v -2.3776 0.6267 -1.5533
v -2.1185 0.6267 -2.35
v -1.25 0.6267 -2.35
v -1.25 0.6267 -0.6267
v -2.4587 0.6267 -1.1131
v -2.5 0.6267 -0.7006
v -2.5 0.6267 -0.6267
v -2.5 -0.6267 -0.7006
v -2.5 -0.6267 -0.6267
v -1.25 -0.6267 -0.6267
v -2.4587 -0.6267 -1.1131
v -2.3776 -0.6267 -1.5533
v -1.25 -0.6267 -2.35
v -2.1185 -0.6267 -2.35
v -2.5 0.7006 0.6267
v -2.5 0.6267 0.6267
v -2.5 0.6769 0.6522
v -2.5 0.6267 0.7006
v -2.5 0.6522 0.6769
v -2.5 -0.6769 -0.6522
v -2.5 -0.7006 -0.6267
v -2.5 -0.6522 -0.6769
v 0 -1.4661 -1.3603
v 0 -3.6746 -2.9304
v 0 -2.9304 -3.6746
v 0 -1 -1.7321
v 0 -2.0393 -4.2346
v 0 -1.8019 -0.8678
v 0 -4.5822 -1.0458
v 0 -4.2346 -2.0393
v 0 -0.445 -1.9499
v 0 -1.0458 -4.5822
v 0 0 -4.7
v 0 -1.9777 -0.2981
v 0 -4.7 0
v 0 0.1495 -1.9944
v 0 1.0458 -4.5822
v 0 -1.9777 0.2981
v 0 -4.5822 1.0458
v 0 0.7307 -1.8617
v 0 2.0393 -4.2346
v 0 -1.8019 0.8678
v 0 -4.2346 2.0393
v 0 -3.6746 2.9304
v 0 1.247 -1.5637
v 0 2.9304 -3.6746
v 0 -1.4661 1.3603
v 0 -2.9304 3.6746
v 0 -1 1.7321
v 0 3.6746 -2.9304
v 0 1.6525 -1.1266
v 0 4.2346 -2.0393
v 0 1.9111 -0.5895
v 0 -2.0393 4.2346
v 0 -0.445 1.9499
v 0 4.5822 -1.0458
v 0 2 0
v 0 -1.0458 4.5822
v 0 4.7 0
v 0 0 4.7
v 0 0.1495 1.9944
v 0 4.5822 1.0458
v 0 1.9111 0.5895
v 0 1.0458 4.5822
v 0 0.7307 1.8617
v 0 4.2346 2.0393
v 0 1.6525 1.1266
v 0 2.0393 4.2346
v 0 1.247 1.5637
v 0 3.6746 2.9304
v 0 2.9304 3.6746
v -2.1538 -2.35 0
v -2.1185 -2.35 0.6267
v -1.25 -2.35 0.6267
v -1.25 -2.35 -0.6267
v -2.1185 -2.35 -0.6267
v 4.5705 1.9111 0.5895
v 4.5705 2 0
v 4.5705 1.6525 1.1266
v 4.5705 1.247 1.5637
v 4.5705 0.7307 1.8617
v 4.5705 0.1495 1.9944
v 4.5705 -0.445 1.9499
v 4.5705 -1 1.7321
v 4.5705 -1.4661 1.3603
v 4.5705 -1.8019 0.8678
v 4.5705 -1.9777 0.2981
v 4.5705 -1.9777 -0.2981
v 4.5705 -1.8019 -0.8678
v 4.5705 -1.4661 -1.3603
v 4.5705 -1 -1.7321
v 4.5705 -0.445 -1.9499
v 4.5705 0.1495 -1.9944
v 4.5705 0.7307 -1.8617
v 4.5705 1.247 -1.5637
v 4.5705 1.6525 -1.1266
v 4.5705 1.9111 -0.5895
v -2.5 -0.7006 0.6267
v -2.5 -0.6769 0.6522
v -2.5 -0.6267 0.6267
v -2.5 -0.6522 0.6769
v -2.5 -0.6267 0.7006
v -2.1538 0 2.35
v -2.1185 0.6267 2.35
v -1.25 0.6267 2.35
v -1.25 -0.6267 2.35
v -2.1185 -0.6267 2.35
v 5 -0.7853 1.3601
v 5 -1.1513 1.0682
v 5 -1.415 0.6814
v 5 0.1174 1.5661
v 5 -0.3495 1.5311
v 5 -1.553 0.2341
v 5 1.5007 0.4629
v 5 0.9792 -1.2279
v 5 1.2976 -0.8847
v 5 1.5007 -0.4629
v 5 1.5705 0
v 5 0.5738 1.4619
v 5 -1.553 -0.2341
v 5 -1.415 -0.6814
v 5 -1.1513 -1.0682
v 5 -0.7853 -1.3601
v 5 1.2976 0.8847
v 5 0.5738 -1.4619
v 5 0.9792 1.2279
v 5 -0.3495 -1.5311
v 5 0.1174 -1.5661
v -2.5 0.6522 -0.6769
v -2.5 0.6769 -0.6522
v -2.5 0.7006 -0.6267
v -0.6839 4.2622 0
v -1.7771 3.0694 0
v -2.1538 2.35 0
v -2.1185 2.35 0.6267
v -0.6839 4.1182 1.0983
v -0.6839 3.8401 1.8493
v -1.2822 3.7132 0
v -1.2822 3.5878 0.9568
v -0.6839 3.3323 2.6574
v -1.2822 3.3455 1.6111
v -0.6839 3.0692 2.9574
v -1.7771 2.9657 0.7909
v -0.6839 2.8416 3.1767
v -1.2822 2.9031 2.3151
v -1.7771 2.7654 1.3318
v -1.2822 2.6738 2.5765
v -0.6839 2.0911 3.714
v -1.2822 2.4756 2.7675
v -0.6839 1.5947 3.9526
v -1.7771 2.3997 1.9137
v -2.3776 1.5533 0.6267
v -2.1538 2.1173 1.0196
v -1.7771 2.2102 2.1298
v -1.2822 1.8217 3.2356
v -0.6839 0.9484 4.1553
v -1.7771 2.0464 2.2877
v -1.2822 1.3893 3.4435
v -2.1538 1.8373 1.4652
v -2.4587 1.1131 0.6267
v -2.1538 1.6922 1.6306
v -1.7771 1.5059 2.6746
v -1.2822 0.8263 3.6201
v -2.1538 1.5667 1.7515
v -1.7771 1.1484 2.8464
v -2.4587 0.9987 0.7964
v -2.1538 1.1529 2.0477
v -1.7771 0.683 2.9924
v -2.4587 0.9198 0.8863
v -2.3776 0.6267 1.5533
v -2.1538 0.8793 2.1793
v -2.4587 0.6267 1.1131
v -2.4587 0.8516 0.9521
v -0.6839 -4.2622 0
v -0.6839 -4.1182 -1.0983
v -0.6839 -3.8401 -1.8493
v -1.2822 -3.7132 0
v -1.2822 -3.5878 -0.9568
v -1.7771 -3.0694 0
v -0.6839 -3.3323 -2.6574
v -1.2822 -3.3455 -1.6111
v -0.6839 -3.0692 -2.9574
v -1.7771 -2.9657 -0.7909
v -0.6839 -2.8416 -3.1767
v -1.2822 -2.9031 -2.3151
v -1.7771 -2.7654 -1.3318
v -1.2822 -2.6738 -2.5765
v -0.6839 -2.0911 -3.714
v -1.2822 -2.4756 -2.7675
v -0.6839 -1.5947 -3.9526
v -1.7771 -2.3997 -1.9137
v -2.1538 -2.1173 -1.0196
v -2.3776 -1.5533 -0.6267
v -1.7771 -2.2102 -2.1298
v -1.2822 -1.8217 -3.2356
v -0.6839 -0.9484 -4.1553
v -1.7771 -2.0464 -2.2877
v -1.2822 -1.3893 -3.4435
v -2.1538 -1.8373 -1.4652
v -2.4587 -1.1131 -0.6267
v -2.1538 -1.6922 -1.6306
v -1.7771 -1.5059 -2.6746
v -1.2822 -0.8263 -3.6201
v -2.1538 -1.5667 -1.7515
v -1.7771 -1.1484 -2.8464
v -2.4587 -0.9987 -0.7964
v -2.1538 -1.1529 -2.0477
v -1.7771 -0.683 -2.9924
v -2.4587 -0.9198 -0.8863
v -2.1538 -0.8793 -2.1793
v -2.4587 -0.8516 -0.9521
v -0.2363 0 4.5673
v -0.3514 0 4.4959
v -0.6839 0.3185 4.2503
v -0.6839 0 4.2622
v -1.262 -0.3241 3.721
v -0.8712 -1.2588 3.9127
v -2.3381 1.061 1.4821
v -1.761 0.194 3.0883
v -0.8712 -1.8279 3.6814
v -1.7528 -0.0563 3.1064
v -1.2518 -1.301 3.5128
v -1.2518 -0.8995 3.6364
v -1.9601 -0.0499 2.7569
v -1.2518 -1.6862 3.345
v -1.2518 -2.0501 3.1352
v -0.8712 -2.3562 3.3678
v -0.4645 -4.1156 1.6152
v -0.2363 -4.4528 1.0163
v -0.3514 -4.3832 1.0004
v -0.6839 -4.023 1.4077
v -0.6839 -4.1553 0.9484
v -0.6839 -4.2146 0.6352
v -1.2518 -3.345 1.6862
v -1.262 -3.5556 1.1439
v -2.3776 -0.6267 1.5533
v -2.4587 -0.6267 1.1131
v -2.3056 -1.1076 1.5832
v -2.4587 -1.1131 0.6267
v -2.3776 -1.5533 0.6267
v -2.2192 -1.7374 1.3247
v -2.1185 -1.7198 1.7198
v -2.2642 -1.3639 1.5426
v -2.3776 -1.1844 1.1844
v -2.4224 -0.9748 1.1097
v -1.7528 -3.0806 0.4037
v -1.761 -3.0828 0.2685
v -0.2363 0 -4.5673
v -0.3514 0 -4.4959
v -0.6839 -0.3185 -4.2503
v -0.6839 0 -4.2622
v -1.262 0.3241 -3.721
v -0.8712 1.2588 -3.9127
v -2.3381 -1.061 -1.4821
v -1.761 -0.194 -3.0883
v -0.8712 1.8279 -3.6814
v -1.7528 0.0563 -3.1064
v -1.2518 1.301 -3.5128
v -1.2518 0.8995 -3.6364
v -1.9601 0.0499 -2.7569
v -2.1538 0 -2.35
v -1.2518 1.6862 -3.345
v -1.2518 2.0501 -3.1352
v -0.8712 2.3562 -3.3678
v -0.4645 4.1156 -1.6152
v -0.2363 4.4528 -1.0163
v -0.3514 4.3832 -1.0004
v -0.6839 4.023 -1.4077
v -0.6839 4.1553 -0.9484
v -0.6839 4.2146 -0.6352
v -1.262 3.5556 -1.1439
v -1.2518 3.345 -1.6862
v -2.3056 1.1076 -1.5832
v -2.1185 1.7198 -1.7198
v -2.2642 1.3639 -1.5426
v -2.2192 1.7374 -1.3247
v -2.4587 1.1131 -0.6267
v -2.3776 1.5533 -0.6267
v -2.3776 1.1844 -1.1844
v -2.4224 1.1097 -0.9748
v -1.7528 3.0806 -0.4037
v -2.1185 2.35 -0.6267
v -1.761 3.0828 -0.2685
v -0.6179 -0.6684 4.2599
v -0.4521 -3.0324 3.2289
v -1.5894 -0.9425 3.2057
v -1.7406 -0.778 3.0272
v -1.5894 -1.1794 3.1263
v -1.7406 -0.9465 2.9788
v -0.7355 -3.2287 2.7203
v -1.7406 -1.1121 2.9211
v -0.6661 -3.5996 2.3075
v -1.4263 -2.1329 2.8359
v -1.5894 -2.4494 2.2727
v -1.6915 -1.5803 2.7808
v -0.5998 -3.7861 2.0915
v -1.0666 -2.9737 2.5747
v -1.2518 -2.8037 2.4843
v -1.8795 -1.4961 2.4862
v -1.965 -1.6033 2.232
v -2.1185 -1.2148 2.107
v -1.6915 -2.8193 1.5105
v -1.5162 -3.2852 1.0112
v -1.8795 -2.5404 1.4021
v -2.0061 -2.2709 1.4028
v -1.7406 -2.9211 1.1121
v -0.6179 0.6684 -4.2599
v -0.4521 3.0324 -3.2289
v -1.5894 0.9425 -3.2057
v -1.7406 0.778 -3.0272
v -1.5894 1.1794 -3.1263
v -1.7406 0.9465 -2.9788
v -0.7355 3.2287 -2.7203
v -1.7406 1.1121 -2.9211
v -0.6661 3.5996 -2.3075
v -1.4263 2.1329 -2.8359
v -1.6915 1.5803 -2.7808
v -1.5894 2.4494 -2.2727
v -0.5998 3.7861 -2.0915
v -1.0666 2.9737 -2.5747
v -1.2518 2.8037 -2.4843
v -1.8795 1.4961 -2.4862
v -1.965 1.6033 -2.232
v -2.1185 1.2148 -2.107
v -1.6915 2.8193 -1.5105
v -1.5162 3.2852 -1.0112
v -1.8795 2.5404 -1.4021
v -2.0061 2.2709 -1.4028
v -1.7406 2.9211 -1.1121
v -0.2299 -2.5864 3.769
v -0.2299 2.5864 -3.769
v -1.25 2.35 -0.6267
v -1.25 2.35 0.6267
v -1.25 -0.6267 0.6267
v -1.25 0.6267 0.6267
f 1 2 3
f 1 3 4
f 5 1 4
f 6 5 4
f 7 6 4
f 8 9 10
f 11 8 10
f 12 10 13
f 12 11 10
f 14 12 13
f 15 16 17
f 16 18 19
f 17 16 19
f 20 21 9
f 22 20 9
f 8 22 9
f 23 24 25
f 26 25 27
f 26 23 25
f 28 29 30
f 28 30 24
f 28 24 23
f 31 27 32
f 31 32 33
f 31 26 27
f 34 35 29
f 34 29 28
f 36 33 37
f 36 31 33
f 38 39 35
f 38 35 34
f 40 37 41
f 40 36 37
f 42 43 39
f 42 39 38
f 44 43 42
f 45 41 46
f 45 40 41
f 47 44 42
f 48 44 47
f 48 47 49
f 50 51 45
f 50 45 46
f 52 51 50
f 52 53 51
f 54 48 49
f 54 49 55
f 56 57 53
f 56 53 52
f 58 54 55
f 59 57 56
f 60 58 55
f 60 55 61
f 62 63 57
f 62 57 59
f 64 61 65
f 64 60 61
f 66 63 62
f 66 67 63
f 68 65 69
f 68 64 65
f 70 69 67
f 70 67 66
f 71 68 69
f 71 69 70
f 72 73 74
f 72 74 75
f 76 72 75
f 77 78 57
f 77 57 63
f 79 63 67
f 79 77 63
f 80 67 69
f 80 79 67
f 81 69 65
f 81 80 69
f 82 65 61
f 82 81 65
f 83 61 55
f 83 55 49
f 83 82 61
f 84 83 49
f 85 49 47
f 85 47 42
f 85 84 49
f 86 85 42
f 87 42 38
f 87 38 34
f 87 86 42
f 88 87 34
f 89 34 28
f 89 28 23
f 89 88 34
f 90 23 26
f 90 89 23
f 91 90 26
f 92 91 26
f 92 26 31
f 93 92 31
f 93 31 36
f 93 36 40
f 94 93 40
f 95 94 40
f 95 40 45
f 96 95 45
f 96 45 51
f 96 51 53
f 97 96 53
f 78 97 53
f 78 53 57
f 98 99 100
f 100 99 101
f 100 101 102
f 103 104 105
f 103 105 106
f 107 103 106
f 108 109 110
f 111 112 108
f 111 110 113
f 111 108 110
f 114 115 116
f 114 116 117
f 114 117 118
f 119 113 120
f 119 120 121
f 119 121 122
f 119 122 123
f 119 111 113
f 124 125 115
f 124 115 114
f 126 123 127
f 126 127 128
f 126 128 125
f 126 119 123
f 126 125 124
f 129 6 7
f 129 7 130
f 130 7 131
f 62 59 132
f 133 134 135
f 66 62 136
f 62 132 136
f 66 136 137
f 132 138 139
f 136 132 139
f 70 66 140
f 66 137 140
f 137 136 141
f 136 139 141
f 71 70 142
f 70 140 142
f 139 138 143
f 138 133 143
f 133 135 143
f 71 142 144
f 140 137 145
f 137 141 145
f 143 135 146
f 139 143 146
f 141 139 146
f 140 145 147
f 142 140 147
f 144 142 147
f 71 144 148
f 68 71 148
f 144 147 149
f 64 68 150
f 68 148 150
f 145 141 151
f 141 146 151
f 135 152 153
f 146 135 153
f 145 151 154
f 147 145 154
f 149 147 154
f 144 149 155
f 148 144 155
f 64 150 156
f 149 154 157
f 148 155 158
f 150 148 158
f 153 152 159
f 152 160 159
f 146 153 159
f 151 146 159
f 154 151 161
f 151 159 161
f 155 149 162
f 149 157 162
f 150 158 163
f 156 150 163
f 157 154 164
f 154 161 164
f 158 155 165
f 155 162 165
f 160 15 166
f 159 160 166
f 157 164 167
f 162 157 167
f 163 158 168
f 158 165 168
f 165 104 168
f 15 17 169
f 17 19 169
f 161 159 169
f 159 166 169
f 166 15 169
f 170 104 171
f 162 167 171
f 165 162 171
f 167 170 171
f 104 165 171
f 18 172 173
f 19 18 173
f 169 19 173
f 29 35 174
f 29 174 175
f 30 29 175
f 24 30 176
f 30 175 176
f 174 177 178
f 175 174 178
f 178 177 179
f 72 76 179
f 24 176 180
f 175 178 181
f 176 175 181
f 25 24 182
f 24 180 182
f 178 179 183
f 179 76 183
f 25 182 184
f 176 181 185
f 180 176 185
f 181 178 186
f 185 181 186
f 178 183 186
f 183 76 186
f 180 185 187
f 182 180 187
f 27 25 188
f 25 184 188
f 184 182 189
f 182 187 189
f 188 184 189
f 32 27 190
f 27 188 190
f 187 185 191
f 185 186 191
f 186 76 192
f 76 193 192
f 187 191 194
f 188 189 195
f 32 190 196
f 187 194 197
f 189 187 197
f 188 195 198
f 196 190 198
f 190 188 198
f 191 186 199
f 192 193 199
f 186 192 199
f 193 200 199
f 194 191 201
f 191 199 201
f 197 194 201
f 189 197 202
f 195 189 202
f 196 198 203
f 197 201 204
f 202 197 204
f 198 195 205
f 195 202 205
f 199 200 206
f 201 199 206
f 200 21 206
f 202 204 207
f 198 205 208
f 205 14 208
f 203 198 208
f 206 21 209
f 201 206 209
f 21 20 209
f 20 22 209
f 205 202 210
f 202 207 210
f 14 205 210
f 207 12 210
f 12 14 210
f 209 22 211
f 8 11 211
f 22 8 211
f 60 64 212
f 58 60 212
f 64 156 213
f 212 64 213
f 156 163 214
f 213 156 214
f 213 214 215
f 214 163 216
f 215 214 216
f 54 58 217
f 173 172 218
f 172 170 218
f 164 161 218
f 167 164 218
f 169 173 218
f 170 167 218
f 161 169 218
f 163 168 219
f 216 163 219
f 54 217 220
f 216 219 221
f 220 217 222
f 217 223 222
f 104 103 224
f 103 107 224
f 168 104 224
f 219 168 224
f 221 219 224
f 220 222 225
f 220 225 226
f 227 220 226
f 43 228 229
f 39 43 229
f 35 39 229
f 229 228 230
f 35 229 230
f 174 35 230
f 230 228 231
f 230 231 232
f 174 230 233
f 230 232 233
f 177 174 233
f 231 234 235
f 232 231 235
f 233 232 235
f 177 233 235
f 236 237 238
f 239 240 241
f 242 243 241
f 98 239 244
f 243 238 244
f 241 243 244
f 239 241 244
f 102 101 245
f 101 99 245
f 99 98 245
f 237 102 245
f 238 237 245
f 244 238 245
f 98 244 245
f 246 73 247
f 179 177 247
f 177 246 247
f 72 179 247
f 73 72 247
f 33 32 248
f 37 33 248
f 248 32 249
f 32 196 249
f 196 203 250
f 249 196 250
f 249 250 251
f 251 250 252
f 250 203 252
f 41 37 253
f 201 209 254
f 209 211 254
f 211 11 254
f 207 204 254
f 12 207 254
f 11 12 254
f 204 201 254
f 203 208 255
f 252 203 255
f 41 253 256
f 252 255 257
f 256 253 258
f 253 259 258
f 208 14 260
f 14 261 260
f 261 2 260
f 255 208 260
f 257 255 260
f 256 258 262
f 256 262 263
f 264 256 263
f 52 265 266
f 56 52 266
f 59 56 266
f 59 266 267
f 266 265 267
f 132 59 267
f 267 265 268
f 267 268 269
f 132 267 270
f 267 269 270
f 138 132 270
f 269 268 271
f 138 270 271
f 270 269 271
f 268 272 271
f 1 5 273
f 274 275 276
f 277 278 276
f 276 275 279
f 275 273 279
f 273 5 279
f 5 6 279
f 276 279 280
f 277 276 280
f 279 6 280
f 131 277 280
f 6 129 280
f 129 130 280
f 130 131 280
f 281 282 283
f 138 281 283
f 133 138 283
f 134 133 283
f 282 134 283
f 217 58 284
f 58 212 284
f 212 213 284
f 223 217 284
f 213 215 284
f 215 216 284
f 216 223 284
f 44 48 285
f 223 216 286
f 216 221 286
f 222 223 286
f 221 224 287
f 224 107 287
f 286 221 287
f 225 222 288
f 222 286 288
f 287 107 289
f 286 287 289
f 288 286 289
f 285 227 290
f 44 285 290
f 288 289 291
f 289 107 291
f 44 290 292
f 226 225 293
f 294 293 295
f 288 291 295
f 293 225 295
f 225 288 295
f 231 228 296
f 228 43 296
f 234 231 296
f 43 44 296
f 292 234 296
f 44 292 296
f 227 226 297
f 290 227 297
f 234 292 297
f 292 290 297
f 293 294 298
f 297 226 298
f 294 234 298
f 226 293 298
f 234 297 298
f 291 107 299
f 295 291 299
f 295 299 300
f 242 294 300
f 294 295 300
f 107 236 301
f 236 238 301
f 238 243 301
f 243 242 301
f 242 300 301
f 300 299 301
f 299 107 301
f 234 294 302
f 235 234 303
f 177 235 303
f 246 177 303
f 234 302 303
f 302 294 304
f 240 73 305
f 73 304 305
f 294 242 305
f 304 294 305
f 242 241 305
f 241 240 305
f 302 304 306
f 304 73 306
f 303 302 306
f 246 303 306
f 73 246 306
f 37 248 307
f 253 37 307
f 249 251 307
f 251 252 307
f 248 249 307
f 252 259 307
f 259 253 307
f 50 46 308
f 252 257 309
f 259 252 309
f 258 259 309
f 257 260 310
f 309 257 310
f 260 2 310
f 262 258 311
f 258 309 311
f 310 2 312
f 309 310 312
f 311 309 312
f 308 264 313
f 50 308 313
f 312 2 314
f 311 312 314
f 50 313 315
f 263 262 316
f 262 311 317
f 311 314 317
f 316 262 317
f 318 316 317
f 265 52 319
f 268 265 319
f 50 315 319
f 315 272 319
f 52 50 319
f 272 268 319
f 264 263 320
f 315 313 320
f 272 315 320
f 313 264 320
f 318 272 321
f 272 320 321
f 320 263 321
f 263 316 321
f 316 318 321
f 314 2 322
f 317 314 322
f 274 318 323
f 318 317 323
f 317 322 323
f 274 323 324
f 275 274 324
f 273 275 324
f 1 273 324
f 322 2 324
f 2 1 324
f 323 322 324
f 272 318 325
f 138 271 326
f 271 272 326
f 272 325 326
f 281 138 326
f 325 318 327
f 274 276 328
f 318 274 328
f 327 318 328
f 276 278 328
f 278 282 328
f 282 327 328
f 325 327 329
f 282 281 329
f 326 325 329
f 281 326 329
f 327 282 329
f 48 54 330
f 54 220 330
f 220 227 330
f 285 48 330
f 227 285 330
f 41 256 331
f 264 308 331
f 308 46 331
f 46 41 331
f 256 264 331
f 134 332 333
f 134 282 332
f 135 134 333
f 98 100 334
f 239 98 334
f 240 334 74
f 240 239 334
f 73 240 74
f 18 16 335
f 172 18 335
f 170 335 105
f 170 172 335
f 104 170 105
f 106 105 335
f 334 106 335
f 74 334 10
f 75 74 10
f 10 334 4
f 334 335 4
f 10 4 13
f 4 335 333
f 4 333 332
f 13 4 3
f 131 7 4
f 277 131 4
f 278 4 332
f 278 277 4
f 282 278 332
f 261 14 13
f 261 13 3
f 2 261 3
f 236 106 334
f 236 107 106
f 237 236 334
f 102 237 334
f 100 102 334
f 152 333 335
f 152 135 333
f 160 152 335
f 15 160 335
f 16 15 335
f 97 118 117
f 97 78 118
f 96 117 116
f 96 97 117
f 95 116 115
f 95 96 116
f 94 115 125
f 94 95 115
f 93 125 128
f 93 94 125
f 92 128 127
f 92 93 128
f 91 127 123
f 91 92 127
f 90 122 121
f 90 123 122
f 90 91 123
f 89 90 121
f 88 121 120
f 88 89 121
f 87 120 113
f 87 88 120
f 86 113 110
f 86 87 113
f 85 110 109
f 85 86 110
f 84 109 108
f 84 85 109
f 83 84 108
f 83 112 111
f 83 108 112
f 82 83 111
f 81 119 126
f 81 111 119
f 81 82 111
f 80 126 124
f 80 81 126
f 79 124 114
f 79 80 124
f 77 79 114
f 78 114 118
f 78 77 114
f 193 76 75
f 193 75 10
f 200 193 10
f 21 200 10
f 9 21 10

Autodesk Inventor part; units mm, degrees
sketch "Sketch_1" plane through (0, 0, 0) normal (0, 0, 1) x (1, 0, 0)
  line L0 (5, 0) -> (-2.5, 0)
  line L1 (-2.5, 0) -> (-2.5, 0.94)
  arc A0 (0, 4.7) -> (-2.5, 0.94) centre (2.1827, 0.5376) ccw
  line L2 (0, 4.7) -> (0, 2)
  line L3 (0, 2) -> (4.5705, 2)
  line L4 (4.5705, 2) -> (5, 1.5705)
  line L5 (5, 1.5705) -> (5, 0)
  line L6 (5, 0) -> (-2.5, 0)
revolve "Revolution1" add sketch "Sketch_1" angle 360 about axis through (5, 0, 0) along (1, 0, 0)
thread "Thread1" size "M4x0.7" class "6g" standard "ISO Metric profile" length 4.2 offset 0.8
sketch "Sketch_2" plane through (-2.5, 0, 0) normal (1, 0, 0) x (0, 0, -1)
  line L0 (-2.35, 0.6267) -> (-2.35, -0.6267)
  line L1 (-2.35, -0.6267) -> (-0.6267, -0.6267)
  line L2 (-0.6267, -0.6267) -> (-0.6267, -2.35)
  line L3 (-0.6267, -2.35) -> (0.6267, -2.35)
  line L4 (0.6267, -2.35) -> (0.6267, -0.6267)
  line L5 (0.6267, -0.6267) -> (2.35, -0.6267)
  line L6 (2.35, -0.6267) -> (2.35, 0.6267)
  line L7 (2.35, 0.6267) -> (0.6267, 0.6267)
  line L8 (0.6267, 0.6267) -> (0.6267, 2.35)
  line L9 (0.6267, 2.35) -> (-0.6267, 2.35)
  line L10 (-0.6267, 2.35) -> (-0.6267, 0.6267)
  line L11 (-0.6267, 0.6267) -> (-2.35, 0.6267)
extrude "Extrusion1" cut sketch "Sketch_2" along normal mid plane 2.5
ref_plane "bolt_to_parts_XY" through (0, 0, 0) normal (1, 0, 0) x (0, 0, -1)
ref_plane "bolt_to_parts_YZ" through (0, 0, 0) normal (0, 0, -1) x (0, 1, 0)
ref_plane "bolt_to_parts_ZX" through (0, 0, 0) normal (0, 1, 0) x (1, 0, 0)
properties part number "BOX-TRSS4-5"
